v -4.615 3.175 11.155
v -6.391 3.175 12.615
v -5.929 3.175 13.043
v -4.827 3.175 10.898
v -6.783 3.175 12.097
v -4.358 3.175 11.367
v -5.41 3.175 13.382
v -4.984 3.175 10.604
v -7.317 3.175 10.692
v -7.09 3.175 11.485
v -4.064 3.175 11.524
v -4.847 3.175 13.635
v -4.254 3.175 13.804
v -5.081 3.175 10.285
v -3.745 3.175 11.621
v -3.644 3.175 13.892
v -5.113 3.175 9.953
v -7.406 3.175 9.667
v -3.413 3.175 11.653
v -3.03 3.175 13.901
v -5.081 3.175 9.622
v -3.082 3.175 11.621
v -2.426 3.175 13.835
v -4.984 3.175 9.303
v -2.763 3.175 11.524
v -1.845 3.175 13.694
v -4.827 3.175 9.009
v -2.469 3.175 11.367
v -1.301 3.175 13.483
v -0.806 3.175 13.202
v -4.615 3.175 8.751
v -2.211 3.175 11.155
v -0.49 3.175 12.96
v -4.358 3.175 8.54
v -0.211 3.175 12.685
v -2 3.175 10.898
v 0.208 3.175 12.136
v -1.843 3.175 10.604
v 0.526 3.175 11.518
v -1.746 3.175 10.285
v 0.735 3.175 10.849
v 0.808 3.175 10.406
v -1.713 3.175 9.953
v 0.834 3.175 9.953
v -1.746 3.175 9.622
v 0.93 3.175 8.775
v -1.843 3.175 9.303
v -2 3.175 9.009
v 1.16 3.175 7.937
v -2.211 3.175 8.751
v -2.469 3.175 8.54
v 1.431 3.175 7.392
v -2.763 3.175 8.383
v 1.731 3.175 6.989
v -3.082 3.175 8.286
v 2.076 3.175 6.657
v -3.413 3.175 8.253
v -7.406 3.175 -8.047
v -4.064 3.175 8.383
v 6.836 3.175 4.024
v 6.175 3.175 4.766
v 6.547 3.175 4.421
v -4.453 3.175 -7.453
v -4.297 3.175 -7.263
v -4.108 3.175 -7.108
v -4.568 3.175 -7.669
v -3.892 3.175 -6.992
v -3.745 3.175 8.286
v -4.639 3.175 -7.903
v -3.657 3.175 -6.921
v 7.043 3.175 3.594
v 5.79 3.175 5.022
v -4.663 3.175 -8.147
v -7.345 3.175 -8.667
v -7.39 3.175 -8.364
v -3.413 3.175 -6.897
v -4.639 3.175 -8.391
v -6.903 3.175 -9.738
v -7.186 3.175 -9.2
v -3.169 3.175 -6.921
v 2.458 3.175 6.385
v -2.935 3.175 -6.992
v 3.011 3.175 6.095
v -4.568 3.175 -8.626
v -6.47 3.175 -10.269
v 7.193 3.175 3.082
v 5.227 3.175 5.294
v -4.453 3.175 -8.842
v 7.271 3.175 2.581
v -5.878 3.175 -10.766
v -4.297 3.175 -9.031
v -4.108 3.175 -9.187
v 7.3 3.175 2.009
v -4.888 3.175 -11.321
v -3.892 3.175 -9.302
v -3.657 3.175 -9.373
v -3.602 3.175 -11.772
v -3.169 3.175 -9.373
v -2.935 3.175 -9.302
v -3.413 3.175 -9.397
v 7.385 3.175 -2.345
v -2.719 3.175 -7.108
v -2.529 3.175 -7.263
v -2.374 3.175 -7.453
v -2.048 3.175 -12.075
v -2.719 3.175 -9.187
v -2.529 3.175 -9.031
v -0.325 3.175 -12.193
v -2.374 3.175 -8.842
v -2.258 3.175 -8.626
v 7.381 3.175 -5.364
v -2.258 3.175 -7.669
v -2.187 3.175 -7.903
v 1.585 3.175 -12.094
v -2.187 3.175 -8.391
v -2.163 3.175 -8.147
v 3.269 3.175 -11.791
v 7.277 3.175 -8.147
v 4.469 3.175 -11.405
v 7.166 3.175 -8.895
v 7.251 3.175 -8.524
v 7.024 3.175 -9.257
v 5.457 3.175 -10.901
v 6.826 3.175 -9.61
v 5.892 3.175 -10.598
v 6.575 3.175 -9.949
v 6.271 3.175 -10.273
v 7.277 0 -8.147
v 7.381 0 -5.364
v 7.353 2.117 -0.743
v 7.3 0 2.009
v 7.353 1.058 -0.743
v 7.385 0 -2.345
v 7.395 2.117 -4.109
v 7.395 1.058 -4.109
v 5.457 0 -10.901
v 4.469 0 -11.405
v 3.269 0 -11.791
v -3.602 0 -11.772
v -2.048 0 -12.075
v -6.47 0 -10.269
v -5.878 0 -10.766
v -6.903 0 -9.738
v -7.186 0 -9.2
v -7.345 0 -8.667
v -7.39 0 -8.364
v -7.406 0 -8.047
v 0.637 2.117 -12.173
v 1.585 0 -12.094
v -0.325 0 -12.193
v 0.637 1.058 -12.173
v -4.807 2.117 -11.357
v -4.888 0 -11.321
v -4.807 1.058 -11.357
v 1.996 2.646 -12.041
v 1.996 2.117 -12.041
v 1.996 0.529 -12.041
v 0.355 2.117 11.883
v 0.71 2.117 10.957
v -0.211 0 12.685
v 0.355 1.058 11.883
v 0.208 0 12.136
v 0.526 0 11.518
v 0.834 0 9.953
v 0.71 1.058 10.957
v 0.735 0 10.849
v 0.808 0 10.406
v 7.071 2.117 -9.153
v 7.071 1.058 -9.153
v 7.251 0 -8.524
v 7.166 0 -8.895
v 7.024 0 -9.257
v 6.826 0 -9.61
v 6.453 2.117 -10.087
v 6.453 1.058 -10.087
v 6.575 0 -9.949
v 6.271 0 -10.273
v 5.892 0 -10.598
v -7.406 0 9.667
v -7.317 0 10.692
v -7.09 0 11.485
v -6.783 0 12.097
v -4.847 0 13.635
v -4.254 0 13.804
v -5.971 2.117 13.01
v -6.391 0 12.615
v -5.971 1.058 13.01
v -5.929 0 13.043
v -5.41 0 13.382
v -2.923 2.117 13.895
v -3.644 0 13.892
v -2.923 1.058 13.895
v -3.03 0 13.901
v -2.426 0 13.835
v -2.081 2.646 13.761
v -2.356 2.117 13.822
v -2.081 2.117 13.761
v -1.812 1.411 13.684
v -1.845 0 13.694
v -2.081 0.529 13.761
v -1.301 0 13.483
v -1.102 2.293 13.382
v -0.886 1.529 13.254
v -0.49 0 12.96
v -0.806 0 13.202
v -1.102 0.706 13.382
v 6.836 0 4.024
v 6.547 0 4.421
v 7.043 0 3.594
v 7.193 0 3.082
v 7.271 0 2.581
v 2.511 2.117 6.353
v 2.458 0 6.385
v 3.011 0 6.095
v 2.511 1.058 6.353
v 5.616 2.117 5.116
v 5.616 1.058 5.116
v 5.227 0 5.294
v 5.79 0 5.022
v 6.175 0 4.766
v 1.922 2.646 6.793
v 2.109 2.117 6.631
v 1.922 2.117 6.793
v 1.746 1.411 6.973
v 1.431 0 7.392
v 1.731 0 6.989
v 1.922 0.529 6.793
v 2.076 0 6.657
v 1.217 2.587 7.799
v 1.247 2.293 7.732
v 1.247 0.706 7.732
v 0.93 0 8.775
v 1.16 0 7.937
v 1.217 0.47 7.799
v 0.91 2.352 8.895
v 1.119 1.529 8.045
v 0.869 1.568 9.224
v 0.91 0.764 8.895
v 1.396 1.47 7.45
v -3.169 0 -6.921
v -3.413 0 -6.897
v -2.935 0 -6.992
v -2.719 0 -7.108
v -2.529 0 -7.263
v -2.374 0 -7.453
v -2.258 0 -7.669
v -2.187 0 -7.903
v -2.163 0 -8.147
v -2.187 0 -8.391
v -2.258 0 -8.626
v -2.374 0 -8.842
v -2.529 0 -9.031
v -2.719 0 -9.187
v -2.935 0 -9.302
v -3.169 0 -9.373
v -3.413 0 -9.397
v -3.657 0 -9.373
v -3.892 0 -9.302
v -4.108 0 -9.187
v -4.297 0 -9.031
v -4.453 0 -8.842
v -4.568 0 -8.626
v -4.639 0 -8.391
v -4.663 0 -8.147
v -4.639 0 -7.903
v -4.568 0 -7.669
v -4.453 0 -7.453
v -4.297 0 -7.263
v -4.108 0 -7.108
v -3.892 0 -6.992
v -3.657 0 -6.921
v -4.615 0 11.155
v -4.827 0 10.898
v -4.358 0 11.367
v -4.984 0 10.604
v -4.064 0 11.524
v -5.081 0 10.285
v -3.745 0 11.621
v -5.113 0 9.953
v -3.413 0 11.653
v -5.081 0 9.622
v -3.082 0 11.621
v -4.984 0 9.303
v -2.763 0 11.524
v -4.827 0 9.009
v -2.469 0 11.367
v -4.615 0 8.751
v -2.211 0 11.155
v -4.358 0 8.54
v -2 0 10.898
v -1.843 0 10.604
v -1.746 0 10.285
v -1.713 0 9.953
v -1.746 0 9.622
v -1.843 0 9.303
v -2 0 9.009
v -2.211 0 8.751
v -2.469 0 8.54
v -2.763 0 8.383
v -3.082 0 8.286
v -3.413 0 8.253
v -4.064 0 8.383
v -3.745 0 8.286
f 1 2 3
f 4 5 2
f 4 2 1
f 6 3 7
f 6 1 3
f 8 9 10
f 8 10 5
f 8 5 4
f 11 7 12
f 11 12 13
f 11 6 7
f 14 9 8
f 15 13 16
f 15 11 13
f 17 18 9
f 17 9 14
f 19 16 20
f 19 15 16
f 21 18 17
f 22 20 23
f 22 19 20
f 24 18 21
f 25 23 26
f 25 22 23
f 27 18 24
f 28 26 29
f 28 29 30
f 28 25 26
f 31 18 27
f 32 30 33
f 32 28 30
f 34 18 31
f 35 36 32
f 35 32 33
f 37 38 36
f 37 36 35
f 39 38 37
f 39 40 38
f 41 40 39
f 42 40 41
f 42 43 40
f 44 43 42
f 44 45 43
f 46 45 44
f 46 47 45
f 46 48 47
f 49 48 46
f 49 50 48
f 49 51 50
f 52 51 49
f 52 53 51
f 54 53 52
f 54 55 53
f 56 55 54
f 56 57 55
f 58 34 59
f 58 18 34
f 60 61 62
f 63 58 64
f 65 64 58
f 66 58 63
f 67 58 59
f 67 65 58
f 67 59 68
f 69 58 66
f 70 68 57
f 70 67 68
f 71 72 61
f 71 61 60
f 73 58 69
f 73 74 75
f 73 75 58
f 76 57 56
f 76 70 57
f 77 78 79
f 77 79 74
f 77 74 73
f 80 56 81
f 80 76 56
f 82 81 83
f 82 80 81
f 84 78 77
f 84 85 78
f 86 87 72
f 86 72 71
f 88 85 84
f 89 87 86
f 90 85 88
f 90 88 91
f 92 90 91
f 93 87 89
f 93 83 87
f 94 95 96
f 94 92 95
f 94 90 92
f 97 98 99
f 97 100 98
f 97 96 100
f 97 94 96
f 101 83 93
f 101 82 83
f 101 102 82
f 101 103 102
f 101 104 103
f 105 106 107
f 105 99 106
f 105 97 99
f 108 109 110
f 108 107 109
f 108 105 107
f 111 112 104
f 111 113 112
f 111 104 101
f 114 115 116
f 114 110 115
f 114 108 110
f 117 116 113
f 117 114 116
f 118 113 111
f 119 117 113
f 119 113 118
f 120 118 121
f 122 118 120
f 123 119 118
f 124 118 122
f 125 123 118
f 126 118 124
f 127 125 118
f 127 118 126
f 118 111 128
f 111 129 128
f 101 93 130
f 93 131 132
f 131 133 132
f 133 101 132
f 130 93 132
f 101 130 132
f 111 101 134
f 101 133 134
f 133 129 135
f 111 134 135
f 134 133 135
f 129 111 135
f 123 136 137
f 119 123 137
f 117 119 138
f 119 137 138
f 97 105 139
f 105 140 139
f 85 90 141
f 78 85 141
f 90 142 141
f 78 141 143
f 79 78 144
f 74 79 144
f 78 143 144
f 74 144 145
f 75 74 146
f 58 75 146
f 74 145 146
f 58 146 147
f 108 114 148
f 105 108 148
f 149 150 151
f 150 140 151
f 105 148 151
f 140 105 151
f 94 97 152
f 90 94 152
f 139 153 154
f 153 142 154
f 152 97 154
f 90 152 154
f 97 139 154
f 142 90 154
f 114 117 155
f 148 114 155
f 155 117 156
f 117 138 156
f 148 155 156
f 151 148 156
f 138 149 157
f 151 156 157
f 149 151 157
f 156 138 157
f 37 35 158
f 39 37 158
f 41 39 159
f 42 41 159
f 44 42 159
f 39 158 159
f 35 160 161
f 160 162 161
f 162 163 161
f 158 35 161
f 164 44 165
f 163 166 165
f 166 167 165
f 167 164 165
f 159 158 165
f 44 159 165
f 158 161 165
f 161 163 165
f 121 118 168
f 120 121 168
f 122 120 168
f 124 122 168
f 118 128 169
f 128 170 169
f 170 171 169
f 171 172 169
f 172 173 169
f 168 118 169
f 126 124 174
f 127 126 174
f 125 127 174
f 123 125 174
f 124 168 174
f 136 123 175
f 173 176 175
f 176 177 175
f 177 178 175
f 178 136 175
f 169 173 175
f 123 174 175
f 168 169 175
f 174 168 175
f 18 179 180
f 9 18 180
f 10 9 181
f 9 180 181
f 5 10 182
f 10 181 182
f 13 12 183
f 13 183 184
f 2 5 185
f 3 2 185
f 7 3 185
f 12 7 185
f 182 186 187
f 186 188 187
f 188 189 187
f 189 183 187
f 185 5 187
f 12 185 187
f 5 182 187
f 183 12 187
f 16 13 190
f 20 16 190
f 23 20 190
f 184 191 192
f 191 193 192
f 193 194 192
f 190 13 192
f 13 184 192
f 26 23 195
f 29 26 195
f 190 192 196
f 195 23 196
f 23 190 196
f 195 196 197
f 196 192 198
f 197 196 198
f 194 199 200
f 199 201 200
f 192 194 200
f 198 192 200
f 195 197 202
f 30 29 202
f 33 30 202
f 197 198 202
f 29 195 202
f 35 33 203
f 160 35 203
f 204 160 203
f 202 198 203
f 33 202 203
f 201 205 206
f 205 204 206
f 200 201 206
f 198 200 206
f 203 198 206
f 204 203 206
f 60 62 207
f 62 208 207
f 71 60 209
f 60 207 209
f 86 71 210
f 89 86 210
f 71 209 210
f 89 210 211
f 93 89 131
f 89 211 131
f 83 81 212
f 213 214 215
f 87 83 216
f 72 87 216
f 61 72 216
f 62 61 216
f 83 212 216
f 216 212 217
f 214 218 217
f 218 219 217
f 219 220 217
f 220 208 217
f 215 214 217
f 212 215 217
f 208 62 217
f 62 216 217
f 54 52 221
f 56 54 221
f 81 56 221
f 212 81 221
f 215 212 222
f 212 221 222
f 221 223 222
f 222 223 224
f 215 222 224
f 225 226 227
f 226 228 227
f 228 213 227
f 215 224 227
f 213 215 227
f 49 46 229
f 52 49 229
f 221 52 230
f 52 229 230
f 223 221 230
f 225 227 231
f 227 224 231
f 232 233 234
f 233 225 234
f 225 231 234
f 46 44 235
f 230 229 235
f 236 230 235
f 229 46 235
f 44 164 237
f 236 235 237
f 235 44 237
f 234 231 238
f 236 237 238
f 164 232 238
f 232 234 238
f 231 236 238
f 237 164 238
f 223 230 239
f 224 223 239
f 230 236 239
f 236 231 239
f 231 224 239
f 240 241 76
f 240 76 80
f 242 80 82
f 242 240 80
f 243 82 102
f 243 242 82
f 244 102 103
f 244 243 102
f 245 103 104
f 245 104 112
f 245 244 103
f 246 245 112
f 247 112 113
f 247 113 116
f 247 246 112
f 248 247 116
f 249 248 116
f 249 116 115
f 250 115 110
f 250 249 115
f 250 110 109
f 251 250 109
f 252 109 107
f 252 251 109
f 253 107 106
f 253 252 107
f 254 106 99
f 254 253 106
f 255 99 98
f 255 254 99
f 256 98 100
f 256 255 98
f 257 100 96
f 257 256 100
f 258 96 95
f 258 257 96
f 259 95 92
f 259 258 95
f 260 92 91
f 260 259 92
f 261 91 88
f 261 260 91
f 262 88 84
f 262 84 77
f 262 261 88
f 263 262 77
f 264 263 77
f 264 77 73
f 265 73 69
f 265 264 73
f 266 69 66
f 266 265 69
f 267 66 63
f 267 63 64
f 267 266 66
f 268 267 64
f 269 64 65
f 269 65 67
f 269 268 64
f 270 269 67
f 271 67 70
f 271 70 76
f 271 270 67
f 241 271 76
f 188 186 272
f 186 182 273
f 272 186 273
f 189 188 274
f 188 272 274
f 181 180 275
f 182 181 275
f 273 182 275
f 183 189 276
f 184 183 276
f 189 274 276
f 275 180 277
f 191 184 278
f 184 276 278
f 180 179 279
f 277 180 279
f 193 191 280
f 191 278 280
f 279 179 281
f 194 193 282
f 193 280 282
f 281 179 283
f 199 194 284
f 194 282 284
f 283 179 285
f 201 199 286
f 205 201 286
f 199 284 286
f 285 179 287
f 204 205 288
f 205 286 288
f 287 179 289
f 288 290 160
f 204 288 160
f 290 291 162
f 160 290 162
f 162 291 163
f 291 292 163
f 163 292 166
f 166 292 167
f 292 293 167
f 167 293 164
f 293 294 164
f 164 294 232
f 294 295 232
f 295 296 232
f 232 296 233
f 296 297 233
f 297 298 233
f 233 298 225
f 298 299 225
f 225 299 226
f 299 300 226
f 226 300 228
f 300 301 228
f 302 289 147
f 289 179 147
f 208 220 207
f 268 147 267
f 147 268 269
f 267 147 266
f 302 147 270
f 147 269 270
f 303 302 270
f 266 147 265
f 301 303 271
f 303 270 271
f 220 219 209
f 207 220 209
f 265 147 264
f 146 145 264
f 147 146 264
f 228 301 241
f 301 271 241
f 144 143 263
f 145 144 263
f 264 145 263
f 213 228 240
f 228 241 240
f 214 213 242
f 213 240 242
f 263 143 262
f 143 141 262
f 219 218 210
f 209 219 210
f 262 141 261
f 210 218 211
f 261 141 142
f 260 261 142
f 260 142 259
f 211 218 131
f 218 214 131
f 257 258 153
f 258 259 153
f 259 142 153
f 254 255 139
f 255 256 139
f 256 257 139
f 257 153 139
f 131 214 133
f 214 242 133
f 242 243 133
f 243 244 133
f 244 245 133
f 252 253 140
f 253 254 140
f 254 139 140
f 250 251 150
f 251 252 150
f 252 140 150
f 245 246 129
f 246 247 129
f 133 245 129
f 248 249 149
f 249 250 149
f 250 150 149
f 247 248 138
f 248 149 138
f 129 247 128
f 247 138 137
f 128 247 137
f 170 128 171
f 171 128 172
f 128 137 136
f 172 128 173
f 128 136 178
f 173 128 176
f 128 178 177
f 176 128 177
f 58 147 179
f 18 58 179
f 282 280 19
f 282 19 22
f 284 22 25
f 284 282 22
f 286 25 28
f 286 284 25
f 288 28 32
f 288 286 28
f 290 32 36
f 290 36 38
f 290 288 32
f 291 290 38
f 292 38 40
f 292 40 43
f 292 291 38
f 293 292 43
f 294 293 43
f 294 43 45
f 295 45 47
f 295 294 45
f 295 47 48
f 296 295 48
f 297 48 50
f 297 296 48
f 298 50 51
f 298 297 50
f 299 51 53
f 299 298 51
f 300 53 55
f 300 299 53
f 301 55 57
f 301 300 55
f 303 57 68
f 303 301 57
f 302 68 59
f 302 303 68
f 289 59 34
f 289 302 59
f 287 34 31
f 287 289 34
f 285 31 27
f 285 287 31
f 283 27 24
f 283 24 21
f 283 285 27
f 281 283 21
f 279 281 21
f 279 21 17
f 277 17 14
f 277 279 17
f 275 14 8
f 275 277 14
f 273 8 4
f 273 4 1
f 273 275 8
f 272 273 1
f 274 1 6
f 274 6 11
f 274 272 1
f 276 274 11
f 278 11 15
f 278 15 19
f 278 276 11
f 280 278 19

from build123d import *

# Parameters (mm, degrees)
SKETCH1_R           = 1.7
SKETCH1_R_2         = 1.25
BOSS_EXTRUDE1_DEPTH = 3.175


with BuildPart() as part:
    # Sketch1 → Boss-Extrude1 (new body)
    with BuildSketch(Plane(origin=(0, 0, 0), x_dir=(1, 0, 0), z_dir=(0, 1, 0))):
        with BuildLine():
            Line((-7.40608976, 8.047333881), (-7.40608976, -9.667484989))
            add(Edge.make_bspline(
                [(-7.40608976, -9.667484989), (-7.427440527, -14.359265116), (-2.104976514, -14.822390535), (-0.211157807, -12.684787438)],
                knots=[3, 3, 3, 3, 4, 4, 4, 4], degree=3))
            add(Edge.make_bspline(
                [(-0.211157807, -12.684787438), (0.454759152, -11.961542687), (0.830932646, -10.979054864), (0.834200784, -9.953266472)],
                knots=[4, 4, 4, 4, 5, 5, 5, 5], degree=3))
            add(Edge.make_bspline(
                [(0.834200784, -9.953266472), (0.847614911, -3.759244356), (7.276744818, -7.46221529), (7.299751606, -2.008967061)],
                knots=[5, 5, 5, 5, 6, 6, 6, 6], degree=3))
            add(Edge.make_bspline(
                [(7.299751606, -2.008967061), (7.310026672, 0.456281555), (7.523736335, 3.752134489), (7.276744819, 8.147321264)],
                knots=[6, 6, 6, 6, 7, 7, 7, 7], degree=3))
            add(Edge.make_bspline(
                [(7.276744819, 8.147321264), (7.287246129, 9.173061108), (6.632340018, 10.163694097), (5.456847891, 10.900933881)],
                knots=[7, 7, 7, 7, 8, 8, 8, 8], degree=3))
            add(Edge.make_bspline(
                [(5.456847891, 10.900933881), (2.10699507, 13.081407092), (-7.386860521, 12.739250307), (-7.40608976, 8.047333881)],
                knots=[8, 8, 8, 8, 9, 9, 9, 9], degree=3))
        make_face()
        with Locations(Location((-3.413173976, -9.953168809, 0), (0, 0, 270))):
            Circle(SKETCH1_R, mode=Mode.SUBTRACT)
        with Locations(Location((-3.413271461, 8.147321264, 0), (0, 0, 270))):
            Circle(SKETCH1_R_2, mode=Mode.SUBTRACT)
    extrude(amount=BOSS_EXTRUDE1_DEPTH)


solid = part.part
